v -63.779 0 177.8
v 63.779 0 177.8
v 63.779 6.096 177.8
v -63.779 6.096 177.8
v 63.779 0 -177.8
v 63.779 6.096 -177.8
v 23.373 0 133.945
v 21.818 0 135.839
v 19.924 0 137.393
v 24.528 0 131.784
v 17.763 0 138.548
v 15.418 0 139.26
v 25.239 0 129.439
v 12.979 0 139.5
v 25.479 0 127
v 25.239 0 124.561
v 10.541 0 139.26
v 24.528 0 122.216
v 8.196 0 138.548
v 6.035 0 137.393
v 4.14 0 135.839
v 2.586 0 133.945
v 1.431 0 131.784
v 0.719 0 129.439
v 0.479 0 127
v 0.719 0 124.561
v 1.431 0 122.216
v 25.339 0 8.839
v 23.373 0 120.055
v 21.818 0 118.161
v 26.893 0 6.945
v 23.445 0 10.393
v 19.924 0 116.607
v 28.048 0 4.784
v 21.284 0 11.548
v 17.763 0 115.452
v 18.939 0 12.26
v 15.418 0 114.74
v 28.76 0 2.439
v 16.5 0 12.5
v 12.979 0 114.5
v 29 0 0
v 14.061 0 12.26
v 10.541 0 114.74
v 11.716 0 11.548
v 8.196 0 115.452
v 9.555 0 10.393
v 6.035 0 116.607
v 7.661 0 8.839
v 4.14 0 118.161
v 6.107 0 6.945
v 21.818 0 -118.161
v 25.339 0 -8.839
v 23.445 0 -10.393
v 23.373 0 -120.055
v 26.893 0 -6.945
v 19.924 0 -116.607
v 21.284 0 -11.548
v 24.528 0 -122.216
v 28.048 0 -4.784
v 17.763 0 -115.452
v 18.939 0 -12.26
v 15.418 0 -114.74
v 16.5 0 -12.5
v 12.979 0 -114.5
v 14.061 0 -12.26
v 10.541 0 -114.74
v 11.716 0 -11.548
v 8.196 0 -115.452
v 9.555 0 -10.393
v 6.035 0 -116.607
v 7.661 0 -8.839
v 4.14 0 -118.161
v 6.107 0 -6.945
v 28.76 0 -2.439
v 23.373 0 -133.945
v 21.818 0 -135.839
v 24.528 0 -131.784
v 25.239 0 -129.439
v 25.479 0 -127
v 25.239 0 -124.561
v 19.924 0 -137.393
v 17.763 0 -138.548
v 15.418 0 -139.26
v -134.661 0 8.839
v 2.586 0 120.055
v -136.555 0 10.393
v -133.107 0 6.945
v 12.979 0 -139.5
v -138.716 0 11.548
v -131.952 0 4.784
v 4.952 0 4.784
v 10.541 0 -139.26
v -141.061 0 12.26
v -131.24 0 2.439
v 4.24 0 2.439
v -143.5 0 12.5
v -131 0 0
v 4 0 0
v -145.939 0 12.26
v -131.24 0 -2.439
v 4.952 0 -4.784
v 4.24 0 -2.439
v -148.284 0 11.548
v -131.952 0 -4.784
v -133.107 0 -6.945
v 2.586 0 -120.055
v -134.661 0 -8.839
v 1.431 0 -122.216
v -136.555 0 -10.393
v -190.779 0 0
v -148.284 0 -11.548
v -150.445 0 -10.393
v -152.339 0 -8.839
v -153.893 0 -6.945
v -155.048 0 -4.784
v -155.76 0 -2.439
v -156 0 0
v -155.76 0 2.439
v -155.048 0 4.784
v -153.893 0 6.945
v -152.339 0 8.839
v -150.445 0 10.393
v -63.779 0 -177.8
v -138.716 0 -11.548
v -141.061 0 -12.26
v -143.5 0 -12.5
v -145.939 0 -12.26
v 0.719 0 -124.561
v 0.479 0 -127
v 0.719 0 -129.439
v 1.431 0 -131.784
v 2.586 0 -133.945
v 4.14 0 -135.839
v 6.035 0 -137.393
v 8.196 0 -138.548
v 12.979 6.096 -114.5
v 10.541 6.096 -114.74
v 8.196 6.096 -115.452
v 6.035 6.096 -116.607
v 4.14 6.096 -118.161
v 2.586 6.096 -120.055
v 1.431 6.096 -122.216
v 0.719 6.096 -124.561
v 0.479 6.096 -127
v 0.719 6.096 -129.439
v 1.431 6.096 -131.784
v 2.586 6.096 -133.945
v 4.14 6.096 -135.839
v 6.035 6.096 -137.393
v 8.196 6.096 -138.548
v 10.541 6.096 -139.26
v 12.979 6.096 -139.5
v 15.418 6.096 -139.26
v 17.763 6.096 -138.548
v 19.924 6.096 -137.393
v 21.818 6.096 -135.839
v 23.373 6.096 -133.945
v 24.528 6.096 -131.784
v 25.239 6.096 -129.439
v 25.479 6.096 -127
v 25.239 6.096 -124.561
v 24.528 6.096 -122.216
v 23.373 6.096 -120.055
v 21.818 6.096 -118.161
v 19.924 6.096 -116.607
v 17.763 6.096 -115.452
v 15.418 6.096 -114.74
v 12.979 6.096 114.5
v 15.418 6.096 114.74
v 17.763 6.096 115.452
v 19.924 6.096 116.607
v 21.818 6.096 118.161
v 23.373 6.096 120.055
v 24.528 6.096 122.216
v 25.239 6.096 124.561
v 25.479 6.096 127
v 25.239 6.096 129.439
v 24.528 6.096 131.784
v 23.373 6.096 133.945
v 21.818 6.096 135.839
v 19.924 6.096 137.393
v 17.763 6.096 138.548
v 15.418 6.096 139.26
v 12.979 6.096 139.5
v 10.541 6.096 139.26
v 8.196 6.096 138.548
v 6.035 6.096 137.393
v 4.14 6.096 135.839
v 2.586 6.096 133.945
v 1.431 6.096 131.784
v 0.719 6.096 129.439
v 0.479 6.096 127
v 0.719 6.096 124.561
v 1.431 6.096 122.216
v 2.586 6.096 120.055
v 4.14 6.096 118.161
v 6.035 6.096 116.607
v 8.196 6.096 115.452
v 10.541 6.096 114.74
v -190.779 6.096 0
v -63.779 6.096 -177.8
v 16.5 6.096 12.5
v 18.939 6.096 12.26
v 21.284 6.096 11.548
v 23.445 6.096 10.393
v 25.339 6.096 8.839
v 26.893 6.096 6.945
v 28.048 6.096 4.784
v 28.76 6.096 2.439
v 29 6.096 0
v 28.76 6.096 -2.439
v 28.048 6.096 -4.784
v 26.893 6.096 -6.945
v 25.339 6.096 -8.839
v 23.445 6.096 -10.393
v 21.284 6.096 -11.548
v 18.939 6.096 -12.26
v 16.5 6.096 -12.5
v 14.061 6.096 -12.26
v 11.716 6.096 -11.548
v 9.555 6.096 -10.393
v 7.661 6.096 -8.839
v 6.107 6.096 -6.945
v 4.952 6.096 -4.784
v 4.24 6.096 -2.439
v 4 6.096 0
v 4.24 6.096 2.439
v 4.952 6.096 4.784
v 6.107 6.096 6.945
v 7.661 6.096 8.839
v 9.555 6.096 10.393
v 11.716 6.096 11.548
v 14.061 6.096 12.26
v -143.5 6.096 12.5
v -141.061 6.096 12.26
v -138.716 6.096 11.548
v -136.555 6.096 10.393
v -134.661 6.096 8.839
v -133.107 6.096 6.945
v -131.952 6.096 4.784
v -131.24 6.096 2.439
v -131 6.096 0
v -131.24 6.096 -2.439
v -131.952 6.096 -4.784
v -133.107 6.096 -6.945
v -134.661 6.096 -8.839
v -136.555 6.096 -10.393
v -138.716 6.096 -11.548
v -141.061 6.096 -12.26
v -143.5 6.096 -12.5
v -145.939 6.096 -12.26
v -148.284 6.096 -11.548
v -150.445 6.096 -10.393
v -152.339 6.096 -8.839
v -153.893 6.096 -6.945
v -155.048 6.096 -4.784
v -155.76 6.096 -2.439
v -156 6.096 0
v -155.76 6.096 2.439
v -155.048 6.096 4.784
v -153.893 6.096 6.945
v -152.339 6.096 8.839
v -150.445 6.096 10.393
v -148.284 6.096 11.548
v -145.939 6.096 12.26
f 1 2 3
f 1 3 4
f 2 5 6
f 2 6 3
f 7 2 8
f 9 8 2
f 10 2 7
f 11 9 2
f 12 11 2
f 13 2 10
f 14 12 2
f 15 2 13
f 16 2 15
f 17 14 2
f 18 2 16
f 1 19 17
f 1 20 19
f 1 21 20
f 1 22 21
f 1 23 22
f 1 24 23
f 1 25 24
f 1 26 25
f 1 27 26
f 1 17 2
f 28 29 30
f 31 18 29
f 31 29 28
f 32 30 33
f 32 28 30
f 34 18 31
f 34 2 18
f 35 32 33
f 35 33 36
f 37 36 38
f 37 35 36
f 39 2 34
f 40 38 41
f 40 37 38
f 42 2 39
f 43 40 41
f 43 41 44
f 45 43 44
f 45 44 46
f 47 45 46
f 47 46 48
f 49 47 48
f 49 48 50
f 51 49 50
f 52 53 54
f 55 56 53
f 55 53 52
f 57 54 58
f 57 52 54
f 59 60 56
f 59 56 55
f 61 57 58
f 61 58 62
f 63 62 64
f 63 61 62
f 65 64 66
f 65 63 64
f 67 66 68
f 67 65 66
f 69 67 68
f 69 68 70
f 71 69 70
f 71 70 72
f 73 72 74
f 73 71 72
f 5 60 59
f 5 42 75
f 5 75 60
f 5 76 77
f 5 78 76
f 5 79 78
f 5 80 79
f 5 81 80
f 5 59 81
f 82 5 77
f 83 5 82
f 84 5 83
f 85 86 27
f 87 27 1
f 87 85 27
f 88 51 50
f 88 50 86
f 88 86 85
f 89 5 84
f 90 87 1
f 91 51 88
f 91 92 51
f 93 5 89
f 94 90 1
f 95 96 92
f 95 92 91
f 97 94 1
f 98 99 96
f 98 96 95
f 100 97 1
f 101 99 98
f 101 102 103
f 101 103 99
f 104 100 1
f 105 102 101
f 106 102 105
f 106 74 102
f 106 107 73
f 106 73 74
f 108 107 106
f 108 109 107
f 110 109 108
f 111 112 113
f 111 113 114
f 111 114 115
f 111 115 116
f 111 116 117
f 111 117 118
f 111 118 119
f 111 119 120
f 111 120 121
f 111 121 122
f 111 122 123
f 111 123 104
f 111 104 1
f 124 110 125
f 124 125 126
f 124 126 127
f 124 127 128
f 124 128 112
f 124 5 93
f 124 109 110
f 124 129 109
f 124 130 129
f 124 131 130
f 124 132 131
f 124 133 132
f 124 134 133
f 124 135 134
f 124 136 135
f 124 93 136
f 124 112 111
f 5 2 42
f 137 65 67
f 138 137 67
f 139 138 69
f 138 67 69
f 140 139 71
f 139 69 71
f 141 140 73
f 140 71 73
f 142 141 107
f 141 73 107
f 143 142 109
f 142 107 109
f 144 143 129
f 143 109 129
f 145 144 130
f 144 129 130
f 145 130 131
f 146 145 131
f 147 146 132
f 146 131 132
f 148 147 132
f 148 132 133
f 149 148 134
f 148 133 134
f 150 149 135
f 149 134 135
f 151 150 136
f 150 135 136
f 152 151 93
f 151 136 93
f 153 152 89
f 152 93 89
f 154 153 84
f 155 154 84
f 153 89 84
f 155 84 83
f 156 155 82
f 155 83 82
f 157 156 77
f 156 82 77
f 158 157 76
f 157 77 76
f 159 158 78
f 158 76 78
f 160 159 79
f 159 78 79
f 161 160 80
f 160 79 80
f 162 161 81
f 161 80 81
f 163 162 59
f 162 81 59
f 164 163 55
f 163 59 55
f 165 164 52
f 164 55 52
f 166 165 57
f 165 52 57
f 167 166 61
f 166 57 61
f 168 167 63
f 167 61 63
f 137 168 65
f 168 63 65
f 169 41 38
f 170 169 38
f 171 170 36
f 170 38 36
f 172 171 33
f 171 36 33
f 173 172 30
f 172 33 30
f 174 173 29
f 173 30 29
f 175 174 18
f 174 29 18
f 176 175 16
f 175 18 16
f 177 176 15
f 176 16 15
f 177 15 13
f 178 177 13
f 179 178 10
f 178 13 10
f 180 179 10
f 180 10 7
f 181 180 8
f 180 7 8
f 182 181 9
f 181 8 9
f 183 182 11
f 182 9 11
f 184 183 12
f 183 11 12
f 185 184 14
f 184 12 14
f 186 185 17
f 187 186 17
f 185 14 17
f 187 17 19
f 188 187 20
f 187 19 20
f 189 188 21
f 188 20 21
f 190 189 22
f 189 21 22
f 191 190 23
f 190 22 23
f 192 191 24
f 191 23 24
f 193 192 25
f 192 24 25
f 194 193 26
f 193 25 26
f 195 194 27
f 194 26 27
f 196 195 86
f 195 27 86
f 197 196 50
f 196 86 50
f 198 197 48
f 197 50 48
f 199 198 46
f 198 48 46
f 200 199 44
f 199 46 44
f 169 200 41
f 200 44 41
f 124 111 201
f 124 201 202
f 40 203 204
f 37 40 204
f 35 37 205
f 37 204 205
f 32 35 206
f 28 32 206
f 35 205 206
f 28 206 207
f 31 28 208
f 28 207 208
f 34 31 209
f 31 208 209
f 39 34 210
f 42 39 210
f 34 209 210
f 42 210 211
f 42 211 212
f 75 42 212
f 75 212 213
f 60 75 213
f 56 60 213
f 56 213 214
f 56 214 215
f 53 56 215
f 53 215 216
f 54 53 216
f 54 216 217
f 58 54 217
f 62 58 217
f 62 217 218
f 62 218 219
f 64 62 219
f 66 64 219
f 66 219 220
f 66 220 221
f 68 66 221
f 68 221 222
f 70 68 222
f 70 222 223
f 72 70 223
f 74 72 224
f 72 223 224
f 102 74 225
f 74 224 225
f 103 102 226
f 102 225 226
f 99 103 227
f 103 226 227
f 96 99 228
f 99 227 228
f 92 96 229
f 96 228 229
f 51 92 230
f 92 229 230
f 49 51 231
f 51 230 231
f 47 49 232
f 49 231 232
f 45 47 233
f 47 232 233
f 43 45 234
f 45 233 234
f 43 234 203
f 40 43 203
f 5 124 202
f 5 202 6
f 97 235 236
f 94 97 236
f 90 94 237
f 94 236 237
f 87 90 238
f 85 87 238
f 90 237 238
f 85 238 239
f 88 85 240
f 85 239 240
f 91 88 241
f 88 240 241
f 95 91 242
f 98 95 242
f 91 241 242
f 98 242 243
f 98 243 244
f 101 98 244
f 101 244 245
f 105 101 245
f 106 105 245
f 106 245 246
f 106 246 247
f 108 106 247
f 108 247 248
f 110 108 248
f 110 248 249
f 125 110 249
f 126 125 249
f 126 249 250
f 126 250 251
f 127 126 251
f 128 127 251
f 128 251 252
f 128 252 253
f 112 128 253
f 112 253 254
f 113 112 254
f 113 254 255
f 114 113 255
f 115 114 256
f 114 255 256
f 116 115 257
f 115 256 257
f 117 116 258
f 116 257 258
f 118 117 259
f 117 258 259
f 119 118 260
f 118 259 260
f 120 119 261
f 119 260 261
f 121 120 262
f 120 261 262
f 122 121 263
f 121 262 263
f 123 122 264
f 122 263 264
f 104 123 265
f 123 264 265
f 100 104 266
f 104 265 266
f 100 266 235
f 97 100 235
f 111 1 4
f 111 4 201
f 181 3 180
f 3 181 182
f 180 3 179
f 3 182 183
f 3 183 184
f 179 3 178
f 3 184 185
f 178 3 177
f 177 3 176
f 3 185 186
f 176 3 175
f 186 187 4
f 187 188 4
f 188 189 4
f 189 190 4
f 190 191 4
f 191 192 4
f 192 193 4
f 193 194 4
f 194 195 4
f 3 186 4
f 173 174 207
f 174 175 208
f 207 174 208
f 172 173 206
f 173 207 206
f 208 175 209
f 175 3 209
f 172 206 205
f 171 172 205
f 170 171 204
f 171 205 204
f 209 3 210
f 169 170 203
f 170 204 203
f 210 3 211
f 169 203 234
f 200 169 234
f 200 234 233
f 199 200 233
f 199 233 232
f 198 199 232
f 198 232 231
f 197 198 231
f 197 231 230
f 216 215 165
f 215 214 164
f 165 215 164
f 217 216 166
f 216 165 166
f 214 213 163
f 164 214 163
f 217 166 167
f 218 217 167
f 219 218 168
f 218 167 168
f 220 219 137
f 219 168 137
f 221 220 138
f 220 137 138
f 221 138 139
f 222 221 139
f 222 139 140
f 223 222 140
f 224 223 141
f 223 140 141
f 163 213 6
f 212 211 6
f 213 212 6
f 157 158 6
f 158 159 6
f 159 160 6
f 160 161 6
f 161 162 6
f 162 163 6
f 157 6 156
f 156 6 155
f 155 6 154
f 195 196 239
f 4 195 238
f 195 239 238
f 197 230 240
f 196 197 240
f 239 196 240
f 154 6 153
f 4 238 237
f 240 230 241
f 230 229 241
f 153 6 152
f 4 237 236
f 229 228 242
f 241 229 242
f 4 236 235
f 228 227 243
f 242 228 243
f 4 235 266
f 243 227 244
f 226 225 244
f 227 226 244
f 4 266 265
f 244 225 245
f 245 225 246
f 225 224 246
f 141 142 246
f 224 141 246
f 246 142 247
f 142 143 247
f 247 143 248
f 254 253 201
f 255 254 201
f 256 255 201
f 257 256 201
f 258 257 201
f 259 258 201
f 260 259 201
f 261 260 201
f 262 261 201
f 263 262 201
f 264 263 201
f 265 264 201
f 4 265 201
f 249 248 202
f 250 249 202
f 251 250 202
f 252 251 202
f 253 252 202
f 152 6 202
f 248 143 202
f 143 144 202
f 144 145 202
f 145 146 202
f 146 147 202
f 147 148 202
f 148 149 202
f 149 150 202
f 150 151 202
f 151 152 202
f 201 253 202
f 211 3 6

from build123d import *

# Parameters (mm, degrees)
BOSS_EXTRUDE1_DEPTH = 6.096
SKETCH3_R           = 12.5
CUT_EXTRUDE1_DEPTH  = 44.45
SKETCH4_R           = 12.5
CUT_EXTRUDE2_DEPTH  = 6.096


with BuildPart() as part:
    # Sketch1 → Boss-Extrude1 (new body)
    with BuildSketch(Plane(origin=(0, 0, 0), x_dir=(1, 0, 0), z_dir=(0, 1, 0))):
        Polygon((-63.779220614, -177.8), (-190.779220614, 0), (-63.779220614, 177.8), (63.779220614, 177.8), (63.779220614, -177.8), align=None)
    extrude(amount=BOSS_EXTRUDE1_DEPTH)

    # Sketch3 → Cut-Extrude1 (cut)
    with BuildSketch(Plane(origin=(0, 6.096, 0), x_dir=(1, 0, 0), z_dir=(0, 1, 0))):
        with Locations(Location((-143.5, 0, 0), (0, 0, 270))):
            Circle(SKETCH3_R)
        with Locations(Location((16.5, 0, 0), (0, 0, 270))):
            Circle(SKETCH3_R)
    extrude(amount=-CUT_EXTRUDE1_DEPTH, mode=Mode.SUBTRACT)

    # Sketch4 → Cut-Extrude2 (cut)
    with BuildSketch(Plane.XZ):
        with Locations(Location((12.979220614, 127, 0), (0, 0, 270))):
            Circle(SKETCH4_R)
        with Locations(Location((12.979220614, -127, 0), (0, 0, 90))):
            Circle(SKETCH4_R)
    extrude(amount=-CUT_EXTRUDE2_DEPTH, mode=Mode.SUBTRACT)


solid = part.part
